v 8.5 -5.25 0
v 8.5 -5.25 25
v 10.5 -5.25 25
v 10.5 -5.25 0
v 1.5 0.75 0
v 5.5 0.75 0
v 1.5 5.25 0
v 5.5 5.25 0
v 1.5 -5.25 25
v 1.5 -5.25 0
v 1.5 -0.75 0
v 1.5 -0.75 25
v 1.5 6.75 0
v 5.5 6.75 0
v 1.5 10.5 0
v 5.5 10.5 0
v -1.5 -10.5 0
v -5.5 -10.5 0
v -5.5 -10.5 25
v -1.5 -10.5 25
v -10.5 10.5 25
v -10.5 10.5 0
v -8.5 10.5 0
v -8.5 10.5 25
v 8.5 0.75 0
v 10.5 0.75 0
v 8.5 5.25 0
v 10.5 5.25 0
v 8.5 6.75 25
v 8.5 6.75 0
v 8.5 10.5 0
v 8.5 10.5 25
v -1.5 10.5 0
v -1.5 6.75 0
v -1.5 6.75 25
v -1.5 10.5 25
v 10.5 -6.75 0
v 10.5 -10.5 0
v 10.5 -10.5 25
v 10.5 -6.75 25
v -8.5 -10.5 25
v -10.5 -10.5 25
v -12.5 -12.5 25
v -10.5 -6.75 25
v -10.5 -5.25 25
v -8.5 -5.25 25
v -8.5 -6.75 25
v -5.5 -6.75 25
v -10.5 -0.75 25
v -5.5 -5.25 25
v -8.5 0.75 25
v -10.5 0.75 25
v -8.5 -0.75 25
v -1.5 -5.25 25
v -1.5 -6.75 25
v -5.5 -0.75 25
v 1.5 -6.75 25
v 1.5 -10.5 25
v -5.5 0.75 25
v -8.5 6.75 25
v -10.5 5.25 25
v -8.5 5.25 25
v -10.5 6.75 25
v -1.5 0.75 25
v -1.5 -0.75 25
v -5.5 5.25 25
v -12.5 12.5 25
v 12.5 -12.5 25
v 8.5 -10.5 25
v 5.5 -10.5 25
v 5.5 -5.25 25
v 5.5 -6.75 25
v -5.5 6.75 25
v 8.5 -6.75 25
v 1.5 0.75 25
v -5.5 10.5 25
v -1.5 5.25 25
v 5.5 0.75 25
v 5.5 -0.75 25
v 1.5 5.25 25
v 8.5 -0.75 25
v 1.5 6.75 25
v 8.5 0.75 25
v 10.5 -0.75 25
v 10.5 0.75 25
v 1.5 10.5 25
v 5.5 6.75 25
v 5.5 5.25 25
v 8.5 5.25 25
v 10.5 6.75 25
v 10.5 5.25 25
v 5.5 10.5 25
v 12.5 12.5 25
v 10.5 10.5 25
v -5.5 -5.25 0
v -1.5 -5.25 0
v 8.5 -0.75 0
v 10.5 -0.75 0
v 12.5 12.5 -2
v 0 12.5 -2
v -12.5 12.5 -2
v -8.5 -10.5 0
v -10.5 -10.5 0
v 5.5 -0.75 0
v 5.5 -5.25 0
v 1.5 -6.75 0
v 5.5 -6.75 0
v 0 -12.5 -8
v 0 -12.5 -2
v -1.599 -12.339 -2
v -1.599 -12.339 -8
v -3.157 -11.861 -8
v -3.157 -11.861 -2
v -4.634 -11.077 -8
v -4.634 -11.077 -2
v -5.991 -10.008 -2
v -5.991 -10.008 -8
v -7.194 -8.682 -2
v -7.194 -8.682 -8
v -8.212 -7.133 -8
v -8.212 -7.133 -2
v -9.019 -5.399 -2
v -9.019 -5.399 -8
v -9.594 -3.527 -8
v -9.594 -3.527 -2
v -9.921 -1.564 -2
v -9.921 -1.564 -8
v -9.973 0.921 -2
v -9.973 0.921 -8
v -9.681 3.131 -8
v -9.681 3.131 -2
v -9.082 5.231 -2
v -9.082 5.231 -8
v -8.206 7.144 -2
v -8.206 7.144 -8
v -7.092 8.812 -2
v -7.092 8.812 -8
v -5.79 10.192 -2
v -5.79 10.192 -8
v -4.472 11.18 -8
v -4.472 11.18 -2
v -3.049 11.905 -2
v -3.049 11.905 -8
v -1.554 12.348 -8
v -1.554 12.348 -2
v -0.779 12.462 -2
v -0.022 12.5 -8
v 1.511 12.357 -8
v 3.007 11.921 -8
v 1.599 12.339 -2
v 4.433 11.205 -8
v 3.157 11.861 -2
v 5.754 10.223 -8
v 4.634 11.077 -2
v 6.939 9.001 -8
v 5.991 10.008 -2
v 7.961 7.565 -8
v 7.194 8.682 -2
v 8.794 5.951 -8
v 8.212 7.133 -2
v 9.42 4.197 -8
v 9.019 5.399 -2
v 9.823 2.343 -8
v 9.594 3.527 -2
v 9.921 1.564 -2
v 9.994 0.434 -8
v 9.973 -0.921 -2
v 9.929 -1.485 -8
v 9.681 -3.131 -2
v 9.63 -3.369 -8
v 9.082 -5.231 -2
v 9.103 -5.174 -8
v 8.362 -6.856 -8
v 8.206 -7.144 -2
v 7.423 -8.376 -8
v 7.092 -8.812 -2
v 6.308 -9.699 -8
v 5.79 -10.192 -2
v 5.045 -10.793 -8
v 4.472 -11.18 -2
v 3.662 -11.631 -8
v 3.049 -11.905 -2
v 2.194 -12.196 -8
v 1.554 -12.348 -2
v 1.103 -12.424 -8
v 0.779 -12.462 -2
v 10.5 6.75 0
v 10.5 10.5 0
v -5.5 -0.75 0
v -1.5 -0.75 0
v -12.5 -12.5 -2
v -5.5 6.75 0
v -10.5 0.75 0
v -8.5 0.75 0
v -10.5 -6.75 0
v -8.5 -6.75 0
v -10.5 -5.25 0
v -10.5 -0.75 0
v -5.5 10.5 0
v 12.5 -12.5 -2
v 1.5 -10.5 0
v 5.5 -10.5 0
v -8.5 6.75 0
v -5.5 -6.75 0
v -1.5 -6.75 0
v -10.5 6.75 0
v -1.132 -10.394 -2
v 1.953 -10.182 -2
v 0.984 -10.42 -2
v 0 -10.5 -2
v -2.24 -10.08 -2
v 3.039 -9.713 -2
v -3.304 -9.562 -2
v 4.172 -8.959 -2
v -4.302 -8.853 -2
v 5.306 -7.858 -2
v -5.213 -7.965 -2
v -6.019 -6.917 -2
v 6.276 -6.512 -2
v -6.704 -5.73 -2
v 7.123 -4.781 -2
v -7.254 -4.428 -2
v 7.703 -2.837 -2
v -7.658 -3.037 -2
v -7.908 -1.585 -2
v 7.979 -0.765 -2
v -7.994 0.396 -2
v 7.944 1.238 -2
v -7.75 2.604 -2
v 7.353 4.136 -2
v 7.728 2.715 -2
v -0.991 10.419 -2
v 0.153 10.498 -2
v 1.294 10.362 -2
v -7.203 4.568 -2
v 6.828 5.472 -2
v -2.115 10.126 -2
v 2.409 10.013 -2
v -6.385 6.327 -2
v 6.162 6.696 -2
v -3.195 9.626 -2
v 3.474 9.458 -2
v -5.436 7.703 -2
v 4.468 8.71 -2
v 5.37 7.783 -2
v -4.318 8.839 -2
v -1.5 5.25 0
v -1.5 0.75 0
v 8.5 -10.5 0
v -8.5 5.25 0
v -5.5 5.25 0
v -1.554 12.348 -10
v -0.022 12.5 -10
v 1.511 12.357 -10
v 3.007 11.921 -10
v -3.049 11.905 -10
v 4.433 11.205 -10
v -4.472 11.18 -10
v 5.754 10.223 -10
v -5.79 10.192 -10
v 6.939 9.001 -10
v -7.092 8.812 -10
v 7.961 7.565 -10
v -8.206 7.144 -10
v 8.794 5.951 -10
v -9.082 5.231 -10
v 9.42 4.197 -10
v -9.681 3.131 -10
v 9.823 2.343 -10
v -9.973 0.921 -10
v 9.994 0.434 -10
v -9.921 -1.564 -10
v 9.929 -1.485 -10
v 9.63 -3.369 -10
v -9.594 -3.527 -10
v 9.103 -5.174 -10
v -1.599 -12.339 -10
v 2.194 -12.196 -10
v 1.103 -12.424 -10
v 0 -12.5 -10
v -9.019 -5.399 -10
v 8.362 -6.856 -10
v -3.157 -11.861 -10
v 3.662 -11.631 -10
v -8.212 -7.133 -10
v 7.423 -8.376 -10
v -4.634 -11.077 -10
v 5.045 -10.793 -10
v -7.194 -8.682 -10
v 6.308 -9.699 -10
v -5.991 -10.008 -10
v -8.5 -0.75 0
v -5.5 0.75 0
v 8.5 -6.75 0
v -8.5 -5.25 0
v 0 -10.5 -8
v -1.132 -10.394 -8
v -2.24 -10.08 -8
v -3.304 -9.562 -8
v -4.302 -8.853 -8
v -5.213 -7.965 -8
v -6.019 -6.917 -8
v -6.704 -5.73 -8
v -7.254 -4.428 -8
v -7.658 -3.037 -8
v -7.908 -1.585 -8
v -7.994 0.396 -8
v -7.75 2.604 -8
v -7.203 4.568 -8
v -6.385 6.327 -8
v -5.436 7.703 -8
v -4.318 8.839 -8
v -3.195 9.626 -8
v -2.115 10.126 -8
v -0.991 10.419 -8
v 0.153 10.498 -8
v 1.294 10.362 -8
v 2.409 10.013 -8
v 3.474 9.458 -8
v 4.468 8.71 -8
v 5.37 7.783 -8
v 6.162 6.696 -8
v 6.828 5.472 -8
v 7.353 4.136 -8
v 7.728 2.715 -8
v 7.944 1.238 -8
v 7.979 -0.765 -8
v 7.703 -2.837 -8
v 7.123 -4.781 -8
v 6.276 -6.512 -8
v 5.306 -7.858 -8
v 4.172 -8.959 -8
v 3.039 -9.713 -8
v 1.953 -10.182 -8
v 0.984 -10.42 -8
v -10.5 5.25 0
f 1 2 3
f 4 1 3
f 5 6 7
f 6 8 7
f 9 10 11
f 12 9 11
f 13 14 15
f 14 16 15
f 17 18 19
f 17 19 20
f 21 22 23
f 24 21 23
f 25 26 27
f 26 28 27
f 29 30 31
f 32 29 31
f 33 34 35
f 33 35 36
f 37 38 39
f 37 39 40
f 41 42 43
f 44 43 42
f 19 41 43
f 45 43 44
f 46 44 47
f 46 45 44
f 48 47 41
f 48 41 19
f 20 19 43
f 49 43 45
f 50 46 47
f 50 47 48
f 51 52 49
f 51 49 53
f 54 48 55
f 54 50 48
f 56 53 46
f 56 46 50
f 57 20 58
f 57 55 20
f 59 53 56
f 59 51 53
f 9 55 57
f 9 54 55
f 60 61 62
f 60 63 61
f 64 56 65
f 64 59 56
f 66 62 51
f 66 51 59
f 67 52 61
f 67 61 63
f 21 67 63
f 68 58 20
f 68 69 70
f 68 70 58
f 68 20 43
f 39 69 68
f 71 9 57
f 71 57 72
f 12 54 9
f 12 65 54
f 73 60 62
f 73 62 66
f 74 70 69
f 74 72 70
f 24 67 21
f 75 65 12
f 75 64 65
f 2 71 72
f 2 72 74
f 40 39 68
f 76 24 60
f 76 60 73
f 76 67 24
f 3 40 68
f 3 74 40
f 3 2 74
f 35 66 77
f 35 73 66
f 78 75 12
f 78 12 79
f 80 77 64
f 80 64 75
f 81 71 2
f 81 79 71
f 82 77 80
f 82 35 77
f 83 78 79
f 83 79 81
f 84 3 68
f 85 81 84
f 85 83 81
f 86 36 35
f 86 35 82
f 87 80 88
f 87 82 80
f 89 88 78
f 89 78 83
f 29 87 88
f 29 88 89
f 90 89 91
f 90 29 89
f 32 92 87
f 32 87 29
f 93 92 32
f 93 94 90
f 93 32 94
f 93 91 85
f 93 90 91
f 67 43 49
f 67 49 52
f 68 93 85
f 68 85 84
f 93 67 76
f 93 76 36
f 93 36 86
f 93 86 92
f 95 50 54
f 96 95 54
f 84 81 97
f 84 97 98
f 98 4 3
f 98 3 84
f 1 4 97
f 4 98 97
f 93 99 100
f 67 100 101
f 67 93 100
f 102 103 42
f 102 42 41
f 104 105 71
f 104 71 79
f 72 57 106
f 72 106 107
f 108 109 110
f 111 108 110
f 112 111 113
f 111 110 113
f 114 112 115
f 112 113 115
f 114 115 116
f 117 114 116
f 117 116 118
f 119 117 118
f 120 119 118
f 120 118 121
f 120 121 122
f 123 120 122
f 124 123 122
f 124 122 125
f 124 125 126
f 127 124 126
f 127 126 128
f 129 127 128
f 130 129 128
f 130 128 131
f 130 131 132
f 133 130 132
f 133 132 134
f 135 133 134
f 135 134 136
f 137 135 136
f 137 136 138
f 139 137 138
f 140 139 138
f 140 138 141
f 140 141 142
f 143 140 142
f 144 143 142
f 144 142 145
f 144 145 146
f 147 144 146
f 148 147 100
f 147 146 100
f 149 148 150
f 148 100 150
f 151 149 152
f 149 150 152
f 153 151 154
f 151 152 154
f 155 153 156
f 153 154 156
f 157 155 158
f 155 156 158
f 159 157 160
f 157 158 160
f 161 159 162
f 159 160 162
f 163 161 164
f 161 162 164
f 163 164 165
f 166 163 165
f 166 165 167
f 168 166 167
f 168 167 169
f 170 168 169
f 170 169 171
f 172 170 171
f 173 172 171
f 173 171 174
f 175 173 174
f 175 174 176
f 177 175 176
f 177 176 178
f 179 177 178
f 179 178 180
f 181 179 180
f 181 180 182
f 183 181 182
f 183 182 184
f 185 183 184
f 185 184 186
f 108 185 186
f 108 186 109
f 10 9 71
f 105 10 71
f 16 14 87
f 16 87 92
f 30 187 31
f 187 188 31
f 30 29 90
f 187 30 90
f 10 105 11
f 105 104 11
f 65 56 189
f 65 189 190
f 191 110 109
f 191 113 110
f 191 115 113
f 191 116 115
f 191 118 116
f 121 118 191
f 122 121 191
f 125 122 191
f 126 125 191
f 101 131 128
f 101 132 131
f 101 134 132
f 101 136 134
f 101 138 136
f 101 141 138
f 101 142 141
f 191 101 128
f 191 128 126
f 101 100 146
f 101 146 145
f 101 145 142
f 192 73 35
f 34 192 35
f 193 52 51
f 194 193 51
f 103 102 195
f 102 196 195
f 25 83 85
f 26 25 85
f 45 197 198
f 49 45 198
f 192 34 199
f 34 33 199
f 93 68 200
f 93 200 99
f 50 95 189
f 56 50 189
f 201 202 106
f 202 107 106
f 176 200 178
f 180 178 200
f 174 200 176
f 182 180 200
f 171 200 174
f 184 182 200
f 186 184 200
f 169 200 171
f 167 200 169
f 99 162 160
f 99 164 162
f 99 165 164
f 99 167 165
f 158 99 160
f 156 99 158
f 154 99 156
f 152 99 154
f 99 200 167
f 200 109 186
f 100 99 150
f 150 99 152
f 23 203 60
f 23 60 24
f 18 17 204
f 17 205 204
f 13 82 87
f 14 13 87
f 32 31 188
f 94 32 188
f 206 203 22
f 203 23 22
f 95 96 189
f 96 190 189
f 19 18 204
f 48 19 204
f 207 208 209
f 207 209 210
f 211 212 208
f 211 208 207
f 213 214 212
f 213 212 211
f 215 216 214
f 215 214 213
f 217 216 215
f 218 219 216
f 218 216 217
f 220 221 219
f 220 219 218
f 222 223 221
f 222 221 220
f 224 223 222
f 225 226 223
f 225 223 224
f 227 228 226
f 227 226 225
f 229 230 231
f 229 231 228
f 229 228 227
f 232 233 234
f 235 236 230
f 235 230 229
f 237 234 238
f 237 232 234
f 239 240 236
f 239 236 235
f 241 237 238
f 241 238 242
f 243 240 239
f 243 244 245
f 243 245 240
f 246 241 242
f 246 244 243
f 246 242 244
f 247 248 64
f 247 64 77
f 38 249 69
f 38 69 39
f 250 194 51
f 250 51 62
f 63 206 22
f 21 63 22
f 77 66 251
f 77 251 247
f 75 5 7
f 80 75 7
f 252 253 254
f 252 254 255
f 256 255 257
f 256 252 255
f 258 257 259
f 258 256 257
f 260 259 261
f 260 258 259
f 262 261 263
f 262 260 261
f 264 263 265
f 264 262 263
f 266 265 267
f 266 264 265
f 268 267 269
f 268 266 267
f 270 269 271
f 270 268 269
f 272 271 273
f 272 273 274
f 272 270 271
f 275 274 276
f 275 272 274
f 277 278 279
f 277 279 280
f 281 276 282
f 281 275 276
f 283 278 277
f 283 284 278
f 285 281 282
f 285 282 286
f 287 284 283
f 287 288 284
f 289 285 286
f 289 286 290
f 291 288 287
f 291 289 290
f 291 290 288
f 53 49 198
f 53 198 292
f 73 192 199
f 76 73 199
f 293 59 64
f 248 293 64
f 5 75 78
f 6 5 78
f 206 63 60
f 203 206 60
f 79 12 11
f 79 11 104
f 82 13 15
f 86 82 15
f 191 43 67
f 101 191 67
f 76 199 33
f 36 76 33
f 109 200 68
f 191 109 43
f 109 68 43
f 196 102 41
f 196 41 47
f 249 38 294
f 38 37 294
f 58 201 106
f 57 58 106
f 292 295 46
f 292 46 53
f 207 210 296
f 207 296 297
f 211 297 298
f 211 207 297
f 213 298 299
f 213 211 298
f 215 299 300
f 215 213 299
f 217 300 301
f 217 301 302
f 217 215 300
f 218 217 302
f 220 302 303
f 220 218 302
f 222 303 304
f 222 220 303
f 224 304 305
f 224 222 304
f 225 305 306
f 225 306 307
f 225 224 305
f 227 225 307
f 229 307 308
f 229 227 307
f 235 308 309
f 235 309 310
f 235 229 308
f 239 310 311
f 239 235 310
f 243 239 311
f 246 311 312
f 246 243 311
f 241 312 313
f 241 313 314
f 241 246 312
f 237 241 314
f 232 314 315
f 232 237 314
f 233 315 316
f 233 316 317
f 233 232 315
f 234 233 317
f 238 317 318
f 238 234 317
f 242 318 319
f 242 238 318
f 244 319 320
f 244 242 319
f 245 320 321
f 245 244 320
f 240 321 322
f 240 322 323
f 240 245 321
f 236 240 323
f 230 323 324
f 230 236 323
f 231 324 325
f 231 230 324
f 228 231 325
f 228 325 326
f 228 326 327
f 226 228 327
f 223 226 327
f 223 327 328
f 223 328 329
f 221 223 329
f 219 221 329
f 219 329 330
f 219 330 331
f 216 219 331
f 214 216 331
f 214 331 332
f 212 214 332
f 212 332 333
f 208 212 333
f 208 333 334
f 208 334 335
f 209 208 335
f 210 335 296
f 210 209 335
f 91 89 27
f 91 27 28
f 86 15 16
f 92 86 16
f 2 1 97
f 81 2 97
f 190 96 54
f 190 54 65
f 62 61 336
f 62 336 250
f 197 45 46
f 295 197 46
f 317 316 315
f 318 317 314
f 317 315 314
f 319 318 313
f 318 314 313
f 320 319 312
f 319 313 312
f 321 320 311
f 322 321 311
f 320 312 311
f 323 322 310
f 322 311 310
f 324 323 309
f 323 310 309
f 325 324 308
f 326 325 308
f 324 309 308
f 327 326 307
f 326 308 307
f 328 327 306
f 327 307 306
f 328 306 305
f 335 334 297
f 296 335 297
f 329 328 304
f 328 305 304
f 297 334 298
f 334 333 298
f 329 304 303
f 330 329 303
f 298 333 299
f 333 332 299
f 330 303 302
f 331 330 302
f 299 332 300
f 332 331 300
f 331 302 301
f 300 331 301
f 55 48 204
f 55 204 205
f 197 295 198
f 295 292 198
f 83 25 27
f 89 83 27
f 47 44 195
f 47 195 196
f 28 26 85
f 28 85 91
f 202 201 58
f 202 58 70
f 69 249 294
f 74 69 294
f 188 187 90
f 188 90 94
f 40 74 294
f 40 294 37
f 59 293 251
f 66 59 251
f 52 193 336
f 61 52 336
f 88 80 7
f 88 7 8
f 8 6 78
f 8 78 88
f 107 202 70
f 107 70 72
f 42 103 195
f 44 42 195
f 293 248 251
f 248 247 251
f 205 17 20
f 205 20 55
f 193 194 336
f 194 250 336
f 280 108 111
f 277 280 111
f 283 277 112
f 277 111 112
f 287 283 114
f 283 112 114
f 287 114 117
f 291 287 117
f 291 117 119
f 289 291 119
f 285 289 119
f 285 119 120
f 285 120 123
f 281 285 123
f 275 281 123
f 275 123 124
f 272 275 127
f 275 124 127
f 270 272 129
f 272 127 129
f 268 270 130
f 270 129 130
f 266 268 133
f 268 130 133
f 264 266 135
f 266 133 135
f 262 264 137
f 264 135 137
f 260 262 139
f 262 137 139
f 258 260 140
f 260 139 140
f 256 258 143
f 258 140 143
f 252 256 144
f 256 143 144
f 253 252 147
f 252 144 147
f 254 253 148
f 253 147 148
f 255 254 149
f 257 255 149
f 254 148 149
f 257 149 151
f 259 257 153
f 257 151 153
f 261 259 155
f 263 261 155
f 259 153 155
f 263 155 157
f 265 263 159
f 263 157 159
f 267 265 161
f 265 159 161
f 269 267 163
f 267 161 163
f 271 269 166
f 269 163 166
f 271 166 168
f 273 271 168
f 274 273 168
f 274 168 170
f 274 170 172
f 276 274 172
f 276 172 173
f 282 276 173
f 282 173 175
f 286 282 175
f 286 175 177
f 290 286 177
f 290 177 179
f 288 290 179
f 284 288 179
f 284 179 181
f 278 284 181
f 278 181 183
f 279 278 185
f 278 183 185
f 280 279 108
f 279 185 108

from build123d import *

# Parameters (mm, degrees)
SKETCH_8_W       = 25
SKETCH_8_H       = 25
SKETCH_8_W_2     = 4
SKETCH_8_H_2     = 21
SKETCH_8_W_3     = 2
EXTRUDE_7_DEPTH  = 25
SKETCH_9_W       = 25
SKETCH_9_H       = 25
EXTRUDE_8_DEPTH  = 2
SKETCH_14_W      = 25
SKETCH_14_H      = 1.5
EXTRUDE_11_DEPTH = 25
SKETCH_16_RX     = 12.5
SKETCH_16_RY     = 10
SKETCH_16_RX_2   = 10.5
SKETCH_16_RY_2   = 8
EXTRUDE_14_DEPTH = 6
SKETCH_22_RX     = 12.5
SKETCH_22_RY     = 10
EXTRUDE_18_DEPTH = 2


with BuildPart() as part:
    # 草图8 → 凸台-拉伸7 (new body)
    with BuildSketch(Plane.XY):
        Rectangle(SKETCH_8_W, SKETCH_8_H)
        with Locations((3.5, 0)):
            Rectangle(SKETCH_8_W_2, SKETCH_8_H_2, mode=Mode.SUBTRACT)
        with Locations((-3.5, 0)):
            Rectangle(SKETCH_8_W_2, SKETCH_8_H_2, mode=Mode.SUBTRACT)
        with Locations((-9.5, 0)):
            Rectangle(SKETCH_8_W_3, SKETCH_8_H_2, mode=Mode.SUBTRACT)
        with Locations((9.5, 0)):
            Rectangle(SKETCH_8_W_3, SKETCH_8_H_2, mode=Mode.SUBTRACT)
    extrude(amount=EXTRUDE_7_DEPTH)

    # 草图9 → 凸台-拉伸8 (add)
    with BuildSketch(Plane(origin=(0, 0, 0), x_dir=(-1, 0, 0), z_dir=(0, 0, -1))):
        Rectangle(SKETCH_9_W, SKETCH_9_H)
    extrude(amount=EXTRUDE_8_DEPTH)

    # 草图14 → 凸台-拉伸11 (add)
    with BuildSketch(Plane.XY.offset(25)):
        Rectangle(SKETCH_14_W, SKETCH_14_H)
        with Locations((0, 6)):
            Rectangle(SKETCH_14_W, SKETCH_14_H)
        with Locations((0, -6)):
            Rectangle(SKETCH_14_W, SKETCH_14_H)
    extrude(amount=-EXTRUDE_11_DEPTH)

    # 草图16 → 凸台-拉伸14 (add)
    with BuildSketch(Plane(origin=(0, 0, -2), x_dir=(-1, 0, 0), z_dir=(0, 0, -1))):
        with Locations(Location((0, 0), (0, 0, -90))):
            Ellipse(SKETCH_16_RX, SKETCH_16_RY)
        with Locations(Location((0, 0), (0, 0, -90))):
            Ellipse(SKETCH_16_RX_2, SKETCH_16_RY_2, mode=Mode.SUBTRACT)
    extrude(amount=EXTRUDE_14_DEPTH)

    # 草图22 → 凸台-拉伸18 (add)
    with BuildSketch(Plane(origin=(0, 0, -8), x_dir=(-1, 0, 0), z_dir=(0, 0, -1))):
        with Locations(Location((0, 0), (0, 0, -90))):
            Ellipse(SKETCH_22_RX, SKETCH_22_RY)
    extrude(amount=EXTRUDE_18_DEPTH)


solid = part.part
